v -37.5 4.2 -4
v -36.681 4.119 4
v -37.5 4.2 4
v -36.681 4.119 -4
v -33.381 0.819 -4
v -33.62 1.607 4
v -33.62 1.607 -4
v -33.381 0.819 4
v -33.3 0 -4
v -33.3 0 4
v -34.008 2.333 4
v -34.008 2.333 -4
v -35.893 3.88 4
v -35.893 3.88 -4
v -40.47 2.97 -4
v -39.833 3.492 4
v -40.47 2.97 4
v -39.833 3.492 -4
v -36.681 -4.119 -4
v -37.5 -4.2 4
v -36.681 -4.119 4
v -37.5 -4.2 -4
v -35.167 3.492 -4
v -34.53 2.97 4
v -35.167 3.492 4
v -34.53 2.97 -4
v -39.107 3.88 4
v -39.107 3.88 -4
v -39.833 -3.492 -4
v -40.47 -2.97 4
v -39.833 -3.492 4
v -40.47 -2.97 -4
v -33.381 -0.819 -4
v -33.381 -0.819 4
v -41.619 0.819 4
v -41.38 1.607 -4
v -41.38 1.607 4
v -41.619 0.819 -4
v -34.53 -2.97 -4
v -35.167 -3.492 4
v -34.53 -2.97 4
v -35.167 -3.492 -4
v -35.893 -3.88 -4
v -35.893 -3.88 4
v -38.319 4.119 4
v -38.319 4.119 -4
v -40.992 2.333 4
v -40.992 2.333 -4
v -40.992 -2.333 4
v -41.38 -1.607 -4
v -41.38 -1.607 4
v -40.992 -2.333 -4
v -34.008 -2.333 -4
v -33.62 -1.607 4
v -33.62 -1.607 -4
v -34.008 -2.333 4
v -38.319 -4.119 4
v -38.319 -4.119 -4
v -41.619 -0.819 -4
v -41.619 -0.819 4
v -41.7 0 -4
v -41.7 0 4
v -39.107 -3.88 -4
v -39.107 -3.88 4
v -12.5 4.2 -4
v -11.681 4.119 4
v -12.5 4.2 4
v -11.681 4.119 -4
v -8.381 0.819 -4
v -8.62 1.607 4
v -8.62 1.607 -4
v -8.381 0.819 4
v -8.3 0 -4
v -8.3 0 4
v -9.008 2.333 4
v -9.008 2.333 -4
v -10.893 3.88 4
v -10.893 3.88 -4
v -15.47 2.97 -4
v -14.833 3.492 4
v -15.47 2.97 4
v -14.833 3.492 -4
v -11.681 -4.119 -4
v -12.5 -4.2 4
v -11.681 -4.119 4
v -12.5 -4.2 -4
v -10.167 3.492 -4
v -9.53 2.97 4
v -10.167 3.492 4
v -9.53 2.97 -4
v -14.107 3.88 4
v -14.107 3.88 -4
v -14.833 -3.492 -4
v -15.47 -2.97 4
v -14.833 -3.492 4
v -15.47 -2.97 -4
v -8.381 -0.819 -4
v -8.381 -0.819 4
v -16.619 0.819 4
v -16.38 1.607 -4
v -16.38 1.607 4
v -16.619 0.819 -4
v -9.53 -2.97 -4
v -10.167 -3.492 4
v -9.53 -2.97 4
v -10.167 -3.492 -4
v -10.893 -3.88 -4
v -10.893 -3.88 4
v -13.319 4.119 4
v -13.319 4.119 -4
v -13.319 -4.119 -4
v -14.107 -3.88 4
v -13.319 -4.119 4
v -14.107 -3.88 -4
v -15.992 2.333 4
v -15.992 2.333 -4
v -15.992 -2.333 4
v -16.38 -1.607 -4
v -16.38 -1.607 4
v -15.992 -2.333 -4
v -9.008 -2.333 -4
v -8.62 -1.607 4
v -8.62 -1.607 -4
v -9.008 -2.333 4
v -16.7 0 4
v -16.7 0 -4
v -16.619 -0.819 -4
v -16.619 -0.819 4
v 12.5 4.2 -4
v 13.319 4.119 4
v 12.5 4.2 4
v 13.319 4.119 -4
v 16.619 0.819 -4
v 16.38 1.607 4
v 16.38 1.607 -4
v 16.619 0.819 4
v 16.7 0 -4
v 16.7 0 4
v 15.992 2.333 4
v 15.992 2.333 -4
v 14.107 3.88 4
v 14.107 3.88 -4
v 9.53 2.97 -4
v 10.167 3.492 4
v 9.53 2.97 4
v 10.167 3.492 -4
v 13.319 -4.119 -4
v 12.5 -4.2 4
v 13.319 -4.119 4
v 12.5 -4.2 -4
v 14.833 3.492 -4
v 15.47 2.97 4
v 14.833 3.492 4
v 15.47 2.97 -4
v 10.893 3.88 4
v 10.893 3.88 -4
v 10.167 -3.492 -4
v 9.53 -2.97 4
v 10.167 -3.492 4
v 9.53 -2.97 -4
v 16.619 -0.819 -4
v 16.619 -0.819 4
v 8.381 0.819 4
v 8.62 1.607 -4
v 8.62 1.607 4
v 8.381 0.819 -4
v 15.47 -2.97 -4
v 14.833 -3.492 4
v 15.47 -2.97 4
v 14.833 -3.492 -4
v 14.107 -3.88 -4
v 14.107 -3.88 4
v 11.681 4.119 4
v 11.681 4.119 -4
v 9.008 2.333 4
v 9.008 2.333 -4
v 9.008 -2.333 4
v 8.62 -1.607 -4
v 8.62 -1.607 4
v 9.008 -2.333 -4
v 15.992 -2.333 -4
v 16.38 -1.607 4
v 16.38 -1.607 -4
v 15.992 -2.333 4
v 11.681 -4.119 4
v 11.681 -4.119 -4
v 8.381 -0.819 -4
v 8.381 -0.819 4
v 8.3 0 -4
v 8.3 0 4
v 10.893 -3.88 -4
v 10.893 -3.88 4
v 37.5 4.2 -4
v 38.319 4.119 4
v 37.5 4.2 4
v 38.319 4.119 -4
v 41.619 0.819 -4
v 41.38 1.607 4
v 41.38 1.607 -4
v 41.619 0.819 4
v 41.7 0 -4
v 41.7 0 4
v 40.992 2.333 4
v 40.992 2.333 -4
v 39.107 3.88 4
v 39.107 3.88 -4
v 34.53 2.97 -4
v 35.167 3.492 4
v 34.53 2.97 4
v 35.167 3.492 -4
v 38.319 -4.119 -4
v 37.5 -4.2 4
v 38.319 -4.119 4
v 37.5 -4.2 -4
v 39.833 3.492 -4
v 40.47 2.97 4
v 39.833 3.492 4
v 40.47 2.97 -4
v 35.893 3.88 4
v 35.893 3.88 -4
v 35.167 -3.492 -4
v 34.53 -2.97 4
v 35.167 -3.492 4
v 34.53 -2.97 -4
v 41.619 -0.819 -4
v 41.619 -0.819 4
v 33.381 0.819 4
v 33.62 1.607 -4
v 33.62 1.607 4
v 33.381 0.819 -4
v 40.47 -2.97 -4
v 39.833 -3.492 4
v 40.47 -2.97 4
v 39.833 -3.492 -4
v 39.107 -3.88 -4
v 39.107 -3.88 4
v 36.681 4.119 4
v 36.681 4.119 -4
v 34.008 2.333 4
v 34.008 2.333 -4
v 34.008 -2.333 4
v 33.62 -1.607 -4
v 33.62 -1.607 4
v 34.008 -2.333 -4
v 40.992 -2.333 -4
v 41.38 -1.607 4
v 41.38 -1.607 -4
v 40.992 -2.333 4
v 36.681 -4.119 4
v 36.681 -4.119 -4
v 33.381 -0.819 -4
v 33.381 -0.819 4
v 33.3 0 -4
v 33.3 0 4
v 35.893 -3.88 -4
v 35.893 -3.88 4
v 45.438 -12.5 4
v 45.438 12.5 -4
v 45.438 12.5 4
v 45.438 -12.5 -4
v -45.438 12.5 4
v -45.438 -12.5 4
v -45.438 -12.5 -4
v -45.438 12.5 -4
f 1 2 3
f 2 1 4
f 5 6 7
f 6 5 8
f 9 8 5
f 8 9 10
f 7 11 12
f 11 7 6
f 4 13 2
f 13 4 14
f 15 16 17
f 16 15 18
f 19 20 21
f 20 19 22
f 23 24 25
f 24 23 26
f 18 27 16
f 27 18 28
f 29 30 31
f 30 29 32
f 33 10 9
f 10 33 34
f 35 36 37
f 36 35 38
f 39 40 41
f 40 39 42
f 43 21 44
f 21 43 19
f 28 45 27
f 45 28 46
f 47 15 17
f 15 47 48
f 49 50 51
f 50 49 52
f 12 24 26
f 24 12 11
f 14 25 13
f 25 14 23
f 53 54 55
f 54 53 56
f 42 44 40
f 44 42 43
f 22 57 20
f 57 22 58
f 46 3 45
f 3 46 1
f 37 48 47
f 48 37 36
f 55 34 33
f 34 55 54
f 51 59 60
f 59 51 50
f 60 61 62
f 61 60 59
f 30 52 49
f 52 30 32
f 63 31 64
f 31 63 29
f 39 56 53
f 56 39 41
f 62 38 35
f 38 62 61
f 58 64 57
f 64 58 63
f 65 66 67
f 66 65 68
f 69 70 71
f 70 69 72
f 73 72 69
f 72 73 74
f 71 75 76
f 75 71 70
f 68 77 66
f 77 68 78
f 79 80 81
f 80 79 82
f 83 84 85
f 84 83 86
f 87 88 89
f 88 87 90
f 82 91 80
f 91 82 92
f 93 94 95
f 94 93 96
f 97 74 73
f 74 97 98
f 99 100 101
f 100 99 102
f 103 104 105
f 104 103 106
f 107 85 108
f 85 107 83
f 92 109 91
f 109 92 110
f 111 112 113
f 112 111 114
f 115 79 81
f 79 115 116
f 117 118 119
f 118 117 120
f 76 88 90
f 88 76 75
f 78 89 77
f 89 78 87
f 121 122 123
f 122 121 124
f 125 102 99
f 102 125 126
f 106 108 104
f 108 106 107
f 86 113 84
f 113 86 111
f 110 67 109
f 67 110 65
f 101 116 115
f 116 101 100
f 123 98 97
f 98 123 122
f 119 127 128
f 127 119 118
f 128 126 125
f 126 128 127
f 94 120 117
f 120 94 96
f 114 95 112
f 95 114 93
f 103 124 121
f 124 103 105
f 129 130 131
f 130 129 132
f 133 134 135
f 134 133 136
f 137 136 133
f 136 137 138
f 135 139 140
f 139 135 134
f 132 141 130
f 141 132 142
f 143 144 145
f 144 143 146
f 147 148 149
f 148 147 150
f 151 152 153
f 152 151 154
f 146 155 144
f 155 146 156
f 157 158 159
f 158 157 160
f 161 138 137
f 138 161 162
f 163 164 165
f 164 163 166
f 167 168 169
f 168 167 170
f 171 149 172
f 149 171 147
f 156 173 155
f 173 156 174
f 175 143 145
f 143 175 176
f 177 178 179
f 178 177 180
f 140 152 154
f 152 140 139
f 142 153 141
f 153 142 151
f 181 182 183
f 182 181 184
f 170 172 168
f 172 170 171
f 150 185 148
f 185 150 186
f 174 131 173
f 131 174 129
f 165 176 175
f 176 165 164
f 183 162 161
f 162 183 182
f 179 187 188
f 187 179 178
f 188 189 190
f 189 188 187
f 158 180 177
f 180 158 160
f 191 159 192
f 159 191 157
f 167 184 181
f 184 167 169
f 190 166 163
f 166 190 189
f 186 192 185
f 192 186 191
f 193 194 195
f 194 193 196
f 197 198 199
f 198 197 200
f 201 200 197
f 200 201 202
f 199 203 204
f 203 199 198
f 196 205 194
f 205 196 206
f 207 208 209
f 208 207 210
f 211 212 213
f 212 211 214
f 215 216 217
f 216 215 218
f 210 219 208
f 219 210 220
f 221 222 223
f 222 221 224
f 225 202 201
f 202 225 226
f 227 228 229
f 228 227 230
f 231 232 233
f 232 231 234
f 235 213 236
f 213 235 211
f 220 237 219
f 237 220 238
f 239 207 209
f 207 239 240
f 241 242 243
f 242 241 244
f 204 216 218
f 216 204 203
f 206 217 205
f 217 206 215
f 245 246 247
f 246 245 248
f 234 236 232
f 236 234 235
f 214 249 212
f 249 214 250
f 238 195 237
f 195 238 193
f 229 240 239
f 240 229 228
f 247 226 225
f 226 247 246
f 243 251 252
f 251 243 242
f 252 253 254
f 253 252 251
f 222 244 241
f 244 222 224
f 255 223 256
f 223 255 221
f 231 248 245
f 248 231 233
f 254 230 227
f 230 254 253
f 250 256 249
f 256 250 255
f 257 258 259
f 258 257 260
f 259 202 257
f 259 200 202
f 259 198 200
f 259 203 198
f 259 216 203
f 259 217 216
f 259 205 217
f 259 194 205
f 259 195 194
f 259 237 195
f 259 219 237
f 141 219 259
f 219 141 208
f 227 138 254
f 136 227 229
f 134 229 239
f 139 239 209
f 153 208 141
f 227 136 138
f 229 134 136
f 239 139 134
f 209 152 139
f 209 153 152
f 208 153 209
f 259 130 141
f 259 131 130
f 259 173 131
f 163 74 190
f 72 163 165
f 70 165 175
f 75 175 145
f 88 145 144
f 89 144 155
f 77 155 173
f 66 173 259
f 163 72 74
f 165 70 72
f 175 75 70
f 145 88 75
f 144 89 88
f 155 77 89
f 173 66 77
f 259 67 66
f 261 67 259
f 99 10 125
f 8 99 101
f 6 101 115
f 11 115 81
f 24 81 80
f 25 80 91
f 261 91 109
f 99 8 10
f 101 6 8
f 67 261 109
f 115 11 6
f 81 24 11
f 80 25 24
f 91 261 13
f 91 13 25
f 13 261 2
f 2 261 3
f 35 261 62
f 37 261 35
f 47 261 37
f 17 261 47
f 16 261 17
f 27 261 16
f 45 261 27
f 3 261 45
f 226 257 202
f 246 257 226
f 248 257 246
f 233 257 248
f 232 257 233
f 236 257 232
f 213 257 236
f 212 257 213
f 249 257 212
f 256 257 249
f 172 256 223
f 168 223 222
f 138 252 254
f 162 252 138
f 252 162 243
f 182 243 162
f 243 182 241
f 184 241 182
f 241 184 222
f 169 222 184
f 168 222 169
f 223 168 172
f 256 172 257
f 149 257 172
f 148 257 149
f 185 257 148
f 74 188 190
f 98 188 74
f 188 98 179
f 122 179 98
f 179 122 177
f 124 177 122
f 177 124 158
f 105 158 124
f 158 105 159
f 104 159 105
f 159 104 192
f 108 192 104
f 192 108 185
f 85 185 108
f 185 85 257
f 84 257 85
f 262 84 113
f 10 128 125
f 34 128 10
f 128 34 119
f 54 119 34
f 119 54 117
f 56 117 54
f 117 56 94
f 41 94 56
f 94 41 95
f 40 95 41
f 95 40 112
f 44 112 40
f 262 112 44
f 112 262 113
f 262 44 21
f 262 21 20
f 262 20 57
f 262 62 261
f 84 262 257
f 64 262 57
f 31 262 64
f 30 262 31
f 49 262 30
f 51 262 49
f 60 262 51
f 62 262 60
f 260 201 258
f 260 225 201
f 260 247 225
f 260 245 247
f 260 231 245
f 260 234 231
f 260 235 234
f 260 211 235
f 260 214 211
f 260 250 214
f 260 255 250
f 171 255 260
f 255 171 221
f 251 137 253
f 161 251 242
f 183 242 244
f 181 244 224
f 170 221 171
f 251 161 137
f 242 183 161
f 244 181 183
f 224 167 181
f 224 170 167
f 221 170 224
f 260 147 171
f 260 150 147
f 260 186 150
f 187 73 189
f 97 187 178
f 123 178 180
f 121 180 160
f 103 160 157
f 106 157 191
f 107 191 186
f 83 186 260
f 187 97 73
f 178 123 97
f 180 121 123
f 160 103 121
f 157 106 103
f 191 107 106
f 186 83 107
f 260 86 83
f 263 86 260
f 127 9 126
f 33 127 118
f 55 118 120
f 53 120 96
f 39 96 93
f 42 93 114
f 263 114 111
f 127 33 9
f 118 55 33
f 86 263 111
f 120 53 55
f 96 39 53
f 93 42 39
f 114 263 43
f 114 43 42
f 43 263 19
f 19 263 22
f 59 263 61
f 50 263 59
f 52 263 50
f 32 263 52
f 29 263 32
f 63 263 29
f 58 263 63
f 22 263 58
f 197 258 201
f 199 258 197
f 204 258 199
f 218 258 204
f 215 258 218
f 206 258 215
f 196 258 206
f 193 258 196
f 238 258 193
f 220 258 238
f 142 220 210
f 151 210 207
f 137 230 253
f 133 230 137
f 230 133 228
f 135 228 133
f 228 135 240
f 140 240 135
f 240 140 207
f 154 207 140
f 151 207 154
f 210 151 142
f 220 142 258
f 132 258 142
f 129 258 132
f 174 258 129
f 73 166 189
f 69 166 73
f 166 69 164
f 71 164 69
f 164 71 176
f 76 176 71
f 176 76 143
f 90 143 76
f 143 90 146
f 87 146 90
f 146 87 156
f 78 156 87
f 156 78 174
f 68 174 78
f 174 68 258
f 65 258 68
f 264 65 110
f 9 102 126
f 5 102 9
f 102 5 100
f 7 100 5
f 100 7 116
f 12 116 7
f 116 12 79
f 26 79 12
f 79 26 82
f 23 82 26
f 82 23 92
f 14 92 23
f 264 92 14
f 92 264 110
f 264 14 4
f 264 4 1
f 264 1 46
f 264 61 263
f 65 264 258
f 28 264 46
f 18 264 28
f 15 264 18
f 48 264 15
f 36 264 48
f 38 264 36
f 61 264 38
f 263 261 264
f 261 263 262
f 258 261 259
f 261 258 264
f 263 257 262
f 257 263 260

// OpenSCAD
$fn = 32;

// ----------------------------------------------------------------------
// Hole bar, 4 x Ø8.4
// skip layout, 7.9375 mm edge offset
// ----------------------------------------------------------------------

// --- parameters (mm) ---
bar_w = 25;         // bar width (Y)
bar_t = 8;          // bar thickness (Z)
holes = 4;          // holes per row
hole_d = 8.4;       // hole diameter
edge = 7.938;       // offset from the bar end to the first hole
grid_pitch = 12.5;  // grid the bar was laid out on

// --- derived feature positions (mm) ---
pitch = grid_pitch * 2;       // = 25   holes sit every other grid slot
span = (holes - 1) * pitch;   // = 75   distance between the end holes
bar_l = span + 2 * edge;      // = 90.88   overall bar length
start_x = -bar_l / 2 + edge;  // = -37.5   X of the first hole
feature_centers = [
  [start_x + 0 * pitch, 0],
  [start_x + 1 * pitch, 0],
  [start_x + 2 * pitch, 0],
  [start_x + 3 * pitch, 0]
];   // hole centres of the first row

// bar with one row of holes, drilled from feature_centers
difference() {
  translate([-bar_l / 2, -bar_w / 2, -bar_t / 2]) cube([bar_l, bar_w, bar_t]);
  for (centre = feature_centers)
    translate([centre[0], centre[1], 0])
      cylinder(d = hole_d, h = bar_t + 2, center = true);
}
